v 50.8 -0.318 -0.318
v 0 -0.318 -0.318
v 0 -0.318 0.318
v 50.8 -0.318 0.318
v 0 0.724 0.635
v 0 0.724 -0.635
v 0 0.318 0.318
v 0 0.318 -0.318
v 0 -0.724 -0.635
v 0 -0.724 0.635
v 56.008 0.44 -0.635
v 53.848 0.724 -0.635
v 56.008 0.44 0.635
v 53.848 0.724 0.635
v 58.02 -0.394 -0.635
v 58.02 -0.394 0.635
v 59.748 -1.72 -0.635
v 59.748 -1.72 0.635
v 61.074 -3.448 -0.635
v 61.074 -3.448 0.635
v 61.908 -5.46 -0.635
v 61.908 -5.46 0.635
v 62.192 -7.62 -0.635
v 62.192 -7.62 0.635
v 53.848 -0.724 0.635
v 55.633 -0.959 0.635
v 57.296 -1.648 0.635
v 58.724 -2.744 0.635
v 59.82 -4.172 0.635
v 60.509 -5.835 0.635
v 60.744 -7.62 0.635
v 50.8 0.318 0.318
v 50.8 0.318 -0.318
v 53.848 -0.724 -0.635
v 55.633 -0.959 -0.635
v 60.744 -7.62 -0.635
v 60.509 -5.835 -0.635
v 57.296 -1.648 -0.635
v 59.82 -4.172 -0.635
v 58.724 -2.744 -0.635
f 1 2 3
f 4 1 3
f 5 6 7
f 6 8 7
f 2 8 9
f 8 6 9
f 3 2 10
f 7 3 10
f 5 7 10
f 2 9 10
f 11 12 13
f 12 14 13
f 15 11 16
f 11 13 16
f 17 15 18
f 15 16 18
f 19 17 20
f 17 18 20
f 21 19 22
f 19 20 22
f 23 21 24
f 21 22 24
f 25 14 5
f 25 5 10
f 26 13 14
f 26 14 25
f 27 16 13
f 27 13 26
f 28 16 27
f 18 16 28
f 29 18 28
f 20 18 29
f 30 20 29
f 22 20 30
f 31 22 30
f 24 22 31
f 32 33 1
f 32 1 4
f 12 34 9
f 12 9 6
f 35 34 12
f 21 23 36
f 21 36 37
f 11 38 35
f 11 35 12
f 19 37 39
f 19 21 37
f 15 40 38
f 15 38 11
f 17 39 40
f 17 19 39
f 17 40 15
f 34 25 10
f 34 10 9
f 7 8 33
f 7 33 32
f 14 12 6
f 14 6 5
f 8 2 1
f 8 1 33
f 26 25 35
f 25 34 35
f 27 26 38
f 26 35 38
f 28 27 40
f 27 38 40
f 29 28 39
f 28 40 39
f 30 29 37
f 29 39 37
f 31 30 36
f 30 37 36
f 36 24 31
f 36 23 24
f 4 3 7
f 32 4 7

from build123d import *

# Parameters (mm, degrees)
SKETCH3_W          = 1.27
SKETCH3_H          = 1.4478
SKETCH9_W          = 0.635
SKETCH9_H          = 0.635
CUT_EXTRUDE1_DEPTH = 50.8


with BuildPart() as part:
    # Sweep2: sweep along a path in Sketch2
    with BuildLine(Plane.XY) as sweep2_path:
        Line((0, 0), (53.848, 0))
        ThreePointArc((53.848, 0), (59.236153673, -2.231846327), (61.468, -7.62))
    # Sketch3 → Sweep2 (sweep)
    with BuildSketch(Plane(origin=(0, 0, 0), x_dir=(0, 0, -1), z_dir=(1, 0, 0))):
        Rectangle(SKETCH3_W, SKETCH3_H)
    sweep(path=sweep2_path.line)

    # Sketch9 → Cut-Extrude1 (cut)
    with BuildSketch(Plane.ZY):
        Rectangle(SKETCH9_W, SKETCH9_H)
    extrude(amount=-CUT_EXTRUDE1_DEPTH, mode=Mode.SUBTRACT)


solid = part.part
